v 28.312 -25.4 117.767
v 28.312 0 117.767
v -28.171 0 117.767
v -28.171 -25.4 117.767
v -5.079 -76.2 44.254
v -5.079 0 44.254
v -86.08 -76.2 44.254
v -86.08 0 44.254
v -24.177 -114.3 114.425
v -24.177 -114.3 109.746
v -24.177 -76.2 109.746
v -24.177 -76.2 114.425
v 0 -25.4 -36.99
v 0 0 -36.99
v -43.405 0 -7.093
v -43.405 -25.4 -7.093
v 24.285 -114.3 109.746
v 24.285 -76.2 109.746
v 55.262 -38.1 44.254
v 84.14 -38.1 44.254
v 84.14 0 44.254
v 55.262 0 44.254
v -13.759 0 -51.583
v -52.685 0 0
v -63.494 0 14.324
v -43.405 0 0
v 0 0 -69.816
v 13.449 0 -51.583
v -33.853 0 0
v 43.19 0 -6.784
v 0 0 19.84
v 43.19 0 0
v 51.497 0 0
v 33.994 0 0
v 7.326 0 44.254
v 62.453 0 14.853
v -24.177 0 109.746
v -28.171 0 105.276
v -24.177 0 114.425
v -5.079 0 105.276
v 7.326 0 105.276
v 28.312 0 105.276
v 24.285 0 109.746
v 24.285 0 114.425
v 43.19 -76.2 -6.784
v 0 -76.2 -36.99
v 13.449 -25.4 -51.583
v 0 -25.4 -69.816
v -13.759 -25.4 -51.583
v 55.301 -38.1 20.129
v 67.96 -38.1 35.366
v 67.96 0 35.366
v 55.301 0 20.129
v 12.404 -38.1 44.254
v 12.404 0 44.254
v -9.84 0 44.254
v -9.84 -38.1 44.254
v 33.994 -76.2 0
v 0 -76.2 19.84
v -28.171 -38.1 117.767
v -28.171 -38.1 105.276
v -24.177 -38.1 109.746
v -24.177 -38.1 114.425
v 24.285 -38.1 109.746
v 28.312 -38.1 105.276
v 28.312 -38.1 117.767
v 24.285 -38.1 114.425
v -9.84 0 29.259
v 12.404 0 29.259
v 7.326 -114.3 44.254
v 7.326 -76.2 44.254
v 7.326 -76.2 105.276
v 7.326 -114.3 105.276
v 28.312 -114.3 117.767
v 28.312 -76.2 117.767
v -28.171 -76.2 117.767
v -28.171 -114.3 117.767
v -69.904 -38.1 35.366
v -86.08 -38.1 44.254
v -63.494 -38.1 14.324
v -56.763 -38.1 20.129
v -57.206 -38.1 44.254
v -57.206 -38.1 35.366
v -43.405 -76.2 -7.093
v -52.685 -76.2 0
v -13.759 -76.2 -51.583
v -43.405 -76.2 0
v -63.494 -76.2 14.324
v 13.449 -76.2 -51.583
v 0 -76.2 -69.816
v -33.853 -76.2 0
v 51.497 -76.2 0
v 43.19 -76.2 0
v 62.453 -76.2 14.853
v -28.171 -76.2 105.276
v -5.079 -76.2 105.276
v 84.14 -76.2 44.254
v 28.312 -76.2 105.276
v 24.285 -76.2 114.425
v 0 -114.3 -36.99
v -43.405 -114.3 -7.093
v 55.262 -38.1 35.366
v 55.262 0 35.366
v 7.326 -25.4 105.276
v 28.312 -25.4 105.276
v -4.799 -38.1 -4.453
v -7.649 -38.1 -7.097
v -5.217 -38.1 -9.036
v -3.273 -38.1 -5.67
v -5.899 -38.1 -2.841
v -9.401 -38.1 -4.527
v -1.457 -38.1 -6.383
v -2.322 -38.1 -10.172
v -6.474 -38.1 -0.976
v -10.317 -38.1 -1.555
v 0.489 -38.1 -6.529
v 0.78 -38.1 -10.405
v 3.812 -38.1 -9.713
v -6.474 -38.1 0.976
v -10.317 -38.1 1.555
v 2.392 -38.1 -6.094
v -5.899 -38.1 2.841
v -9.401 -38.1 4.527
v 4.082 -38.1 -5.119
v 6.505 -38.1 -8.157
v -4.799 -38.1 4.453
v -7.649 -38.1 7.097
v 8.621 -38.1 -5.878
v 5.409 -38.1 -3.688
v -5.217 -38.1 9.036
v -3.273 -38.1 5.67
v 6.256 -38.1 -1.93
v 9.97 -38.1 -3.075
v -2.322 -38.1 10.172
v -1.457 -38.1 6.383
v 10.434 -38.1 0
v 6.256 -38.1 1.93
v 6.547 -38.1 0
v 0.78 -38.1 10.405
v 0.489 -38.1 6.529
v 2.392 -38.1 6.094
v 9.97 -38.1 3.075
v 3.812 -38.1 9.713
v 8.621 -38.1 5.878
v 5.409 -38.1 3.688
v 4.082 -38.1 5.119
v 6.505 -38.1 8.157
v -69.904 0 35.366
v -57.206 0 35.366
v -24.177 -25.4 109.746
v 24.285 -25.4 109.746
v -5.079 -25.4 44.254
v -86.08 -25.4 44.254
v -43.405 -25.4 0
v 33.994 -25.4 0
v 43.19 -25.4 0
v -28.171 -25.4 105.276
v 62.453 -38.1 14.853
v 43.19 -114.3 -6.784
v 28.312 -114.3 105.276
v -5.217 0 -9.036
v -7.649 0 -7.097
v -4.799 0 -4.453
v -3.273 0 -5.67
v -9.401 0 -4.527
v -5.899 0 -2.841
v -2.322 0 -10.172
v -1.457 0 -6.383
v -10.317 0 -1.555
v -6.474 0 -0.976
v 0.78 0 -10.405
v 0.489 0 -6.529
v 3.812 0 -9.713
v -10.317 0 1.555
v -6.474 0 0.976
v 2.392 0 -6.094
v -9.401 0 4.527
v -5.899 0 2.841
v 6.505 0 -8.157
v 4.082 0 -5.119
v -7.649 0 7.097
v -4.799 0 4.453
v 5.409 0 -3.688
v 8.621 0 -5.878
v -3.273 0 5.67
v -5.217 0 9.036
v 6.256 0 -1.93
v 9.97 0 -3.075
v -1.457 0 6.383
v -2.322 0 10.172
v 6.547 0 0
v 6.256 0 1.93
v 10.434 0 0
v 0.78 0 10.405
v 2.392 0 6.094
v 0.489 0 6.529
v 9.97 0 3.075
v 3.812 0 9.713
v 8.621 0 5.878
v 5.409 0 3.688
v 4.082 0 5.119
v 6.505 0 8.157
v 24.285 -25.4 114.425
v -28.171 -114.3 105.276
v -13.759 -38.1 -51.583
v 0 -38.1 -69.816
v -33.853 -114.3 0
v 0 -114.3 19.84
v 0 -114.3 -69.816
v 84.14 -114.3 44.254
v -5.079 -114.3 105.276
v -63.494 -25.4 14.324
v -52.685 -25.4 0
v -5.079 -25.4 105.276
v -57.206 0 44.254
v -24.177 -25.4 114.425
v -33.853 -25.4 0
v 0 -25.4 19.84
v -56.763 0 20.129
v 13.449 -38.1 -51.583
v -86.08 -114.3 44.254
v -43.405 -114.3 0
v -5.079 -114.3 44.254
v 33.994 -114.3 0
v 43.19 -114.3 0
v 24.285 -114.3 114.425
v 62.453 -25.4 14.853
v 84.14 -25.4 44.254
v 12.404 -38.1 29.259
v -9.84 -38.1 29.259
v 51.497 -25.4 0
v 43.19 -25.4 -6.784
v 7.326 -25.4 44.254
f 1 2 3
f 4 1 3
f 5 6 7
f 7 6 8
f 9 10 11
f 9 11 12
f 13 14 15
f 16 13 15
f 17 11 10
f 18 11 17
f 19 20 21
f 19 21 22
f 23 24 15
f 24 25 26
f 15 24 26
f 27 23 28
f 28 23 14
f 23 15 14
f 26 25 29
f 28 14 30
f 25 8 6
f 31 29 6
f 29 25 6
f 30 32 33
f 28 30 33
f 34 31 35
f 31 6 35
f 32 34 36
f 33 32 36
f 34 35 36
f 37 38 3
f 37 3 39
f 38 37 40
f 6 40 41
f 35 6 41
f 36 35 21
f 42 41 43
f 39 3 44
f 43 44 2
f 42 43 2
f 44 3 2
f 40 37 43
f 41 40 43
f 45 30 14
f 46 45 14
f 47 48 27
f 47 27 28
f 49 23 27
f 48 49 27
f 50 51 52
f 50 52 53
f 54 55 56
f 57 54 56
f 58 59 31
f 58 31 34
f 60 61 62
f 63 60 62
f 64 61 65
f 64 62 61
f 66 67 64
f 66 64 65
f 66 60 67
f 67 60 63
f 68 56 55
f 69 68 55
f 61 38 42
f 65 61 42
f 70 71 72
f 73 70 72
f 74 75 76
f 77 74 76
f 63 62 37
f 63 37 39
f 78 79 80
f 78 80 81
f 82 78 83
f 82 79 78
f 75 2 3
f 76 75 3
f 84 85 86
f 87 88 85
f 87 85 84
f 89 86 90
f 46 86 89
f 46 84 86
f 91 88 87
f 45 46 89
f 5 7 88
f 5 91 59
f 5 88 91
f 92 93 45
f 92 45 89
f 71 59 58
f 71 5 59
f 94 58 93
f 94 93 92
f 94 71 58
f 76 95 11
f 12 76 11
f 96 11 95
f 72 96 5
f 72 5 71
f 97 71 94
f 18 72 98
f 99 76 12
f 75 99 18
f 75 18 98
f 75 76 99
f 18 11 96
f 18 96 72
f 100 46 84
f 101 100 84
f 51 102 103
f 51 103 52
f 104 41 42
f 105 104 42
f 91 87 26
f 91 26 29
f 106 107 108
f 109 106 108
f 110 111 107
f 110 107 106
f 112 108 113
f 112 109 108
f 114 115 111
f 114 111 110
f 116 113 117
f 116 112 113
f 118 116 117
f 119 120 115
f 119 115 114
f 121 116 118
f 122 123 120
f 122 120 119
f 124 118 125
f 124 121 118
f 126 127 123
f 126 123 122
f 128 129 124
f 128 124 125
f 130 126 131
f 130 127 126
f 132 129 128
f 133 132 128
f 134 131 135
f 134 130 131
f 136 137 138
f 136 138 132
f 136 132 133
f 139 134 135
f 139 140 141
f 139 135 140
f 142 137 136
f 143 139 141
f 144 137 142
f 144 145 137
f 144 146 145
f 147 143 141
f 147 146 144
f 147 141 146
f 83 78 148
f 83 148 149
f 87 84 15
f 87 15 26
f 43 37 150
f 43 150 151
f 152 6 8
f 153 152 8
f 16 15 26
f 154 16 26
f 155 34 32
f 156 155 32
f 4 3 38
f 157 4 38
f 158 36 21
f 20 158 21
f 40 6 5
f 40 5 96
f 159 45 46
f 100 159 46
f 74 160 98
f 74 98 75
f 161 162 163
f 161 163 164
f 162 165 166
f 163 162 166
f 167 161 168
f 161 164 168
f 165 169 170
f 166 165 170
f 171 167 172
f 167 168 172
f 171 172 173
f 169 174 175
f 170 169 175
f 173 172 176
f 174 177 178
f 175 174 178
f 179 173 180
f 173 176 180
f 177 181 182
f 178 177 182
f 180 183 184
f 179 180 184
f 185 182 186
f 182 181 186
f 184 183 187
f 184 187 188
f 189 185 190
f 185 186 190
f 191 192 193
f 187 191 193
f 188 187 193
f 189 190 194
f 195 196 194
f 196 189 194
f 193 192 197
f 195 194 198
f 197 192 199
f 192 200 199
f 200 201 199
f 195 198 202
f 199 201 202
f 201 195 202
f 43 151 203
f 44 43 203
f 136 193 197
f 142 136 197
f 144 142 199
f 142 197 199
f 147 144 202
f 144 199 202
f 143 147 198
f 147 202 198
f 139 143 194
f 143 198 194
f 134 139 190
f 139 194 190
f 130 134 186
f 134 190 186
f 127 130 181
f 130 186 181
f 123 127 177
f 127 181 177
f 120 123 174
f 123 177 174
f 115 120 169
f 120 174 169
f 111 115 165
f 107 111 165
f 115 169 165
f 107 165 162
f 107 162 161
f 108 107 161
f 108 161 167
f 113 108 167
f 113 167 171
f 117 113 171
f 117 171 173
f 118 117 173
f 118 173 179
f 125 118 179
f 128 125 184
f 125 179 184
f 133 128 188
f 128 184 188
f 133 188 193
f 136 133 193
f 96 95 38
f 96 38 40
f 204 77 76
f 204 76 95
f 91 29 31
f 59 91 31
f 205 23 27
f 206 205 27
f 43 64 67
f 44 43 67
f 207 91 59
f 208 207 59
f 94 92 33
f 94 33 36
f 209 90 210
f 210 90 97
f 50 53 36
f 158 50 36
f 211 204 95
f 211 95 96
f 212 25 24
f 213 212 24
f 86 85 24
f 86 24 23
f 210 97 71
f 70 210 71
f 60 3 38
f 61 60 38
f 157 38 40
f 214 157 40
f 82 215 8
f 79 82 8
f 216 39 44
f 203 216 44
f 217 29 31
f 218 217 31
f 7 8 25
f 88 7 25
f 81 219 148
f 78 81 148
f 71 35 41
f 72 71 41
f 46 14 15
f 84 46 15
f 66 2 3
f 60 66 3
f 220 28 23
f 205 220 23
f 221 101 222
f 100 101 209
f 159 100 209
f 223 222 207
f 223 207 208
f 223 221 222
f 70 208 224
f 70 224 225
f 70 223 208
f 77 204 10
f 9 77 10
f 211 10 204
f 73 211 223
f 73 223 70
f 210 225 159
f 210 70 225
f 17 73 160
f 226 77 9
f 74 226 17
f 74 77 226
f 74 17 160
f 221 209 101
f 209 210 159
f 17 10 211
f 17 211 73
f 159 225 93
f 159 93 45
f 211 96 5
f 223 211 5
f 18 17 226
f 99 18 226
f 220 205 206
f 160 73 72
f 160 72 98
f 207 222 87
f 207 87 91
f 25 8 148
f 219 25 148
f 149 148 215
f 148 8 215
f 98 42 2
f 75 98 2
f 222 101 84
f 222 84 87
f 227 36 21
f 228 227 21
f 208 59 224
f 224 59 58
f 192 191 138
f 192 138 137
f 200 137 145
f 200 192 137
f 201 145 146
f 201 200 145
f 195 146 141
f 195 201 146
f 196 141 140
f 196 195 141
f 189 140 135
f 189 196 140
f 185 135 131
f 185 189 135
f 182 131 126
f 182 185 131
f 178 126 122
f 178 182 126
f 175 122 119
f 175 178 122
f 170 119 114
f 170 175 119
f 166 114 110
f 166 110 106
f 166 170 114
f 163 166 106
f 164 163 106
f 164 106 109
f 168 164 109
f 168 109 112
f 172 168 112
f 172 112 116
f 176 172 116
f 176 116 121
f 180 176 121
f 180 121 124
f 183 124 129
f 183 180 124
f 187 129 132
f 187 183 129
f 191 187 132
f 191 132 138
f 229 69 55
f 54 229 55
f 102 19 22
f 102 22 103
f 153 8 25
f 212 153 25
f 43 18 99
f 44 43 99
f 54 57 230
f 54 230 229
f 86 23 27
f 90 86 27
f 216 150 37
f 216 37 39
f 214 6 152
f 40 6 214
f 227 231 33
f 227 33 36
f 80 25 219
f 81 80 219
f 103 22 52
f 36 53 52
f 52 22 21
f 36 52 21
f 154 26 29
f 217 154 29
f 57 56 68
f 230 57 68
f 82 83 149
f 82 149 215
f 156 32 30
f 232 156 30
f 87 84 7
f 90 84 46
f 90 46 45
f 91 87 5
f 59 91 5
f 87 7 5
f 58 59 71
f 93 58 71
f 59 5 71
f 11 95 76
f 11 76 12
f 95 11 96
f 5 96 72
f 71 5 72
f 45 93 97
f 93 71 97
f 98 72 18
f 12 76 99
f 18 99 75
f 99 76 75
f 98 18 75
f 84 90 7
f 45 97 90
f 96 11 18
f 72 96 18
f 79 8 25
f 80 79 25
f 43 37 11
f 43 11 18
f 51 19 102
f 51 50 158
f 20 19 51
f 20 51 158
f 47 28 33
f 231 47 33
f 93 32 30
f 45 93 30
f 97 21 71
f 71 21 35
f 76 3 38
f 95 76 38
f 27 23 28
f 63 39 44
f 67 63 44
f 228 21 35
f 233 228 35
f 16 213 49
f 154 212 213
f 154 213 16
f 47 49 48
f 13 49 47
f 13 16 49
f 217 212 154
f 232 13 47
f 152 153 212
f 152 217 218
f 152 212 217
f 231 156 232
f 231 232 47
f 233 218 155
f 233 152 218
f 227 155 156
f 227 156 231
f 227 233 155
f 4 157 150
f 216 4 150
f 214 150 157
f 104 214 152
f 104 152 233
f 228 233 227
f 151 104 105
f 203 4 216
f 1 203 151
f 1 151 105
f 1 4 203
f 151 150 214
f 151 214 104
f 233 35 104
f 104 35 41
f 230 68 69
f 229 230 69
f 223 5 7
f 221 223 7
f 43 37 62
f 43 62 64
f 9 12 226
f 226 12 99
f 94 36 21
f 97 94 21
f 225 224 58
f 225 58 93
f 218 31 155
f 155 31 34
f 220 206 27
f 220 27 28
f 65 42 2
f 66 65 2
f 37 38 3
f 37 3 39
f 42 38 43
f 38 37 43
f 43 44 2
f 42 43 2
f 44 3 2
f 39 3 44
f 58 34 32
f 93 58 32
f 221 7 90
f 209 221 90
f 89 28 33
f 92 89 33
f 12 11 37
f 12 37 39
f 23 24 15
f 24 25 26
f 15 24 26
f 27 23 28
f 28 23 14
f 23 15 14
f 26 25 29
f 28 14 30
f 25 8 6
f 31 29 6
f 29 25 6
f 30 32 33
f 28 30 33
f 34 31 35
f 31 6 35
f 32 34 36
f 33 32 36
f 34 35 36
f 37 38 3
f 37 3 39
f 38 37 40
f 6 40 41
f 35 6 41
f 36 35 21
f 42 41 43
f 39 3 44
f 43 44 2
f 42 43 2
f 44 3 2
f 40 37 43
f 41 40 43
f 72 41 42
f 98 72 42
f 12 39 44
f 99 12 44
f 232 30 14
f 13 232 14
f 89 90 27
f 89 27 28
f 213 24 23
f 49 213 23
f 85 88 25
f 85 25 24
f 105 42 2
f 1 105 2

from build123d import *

# Parameters (mm, degrees)
F0_W      = 48.461918
F0_H      = 4.679083
F0_R      = 10.433779
F0_R_2    = 6.546858
F1_DEPTH  = 38.1
F0_W_2    = 12.404488
F0_H_2    = 61.022204
F2_DEPTH  = 76.2
F2_FACE_W = 48.461918
F2_FACE_H = 4.679083
F3_DEPTH  = 38.1
F4_DEPTH  = 25.4


with BuildPart() as f1:
    # F0 (on Front) → F1 (new body)
    with BuildSketch(Plane.XZ):
        Polygon((62.453386, 14.853092), (84.140211, 44.254274), (55.262458, 44.254274), (55.262458, 35.366073), (67.959888, 35.366073), (55.300537, 20.129158), align=None)
        Polygon((0, -69.815982), (13.449272, -51.582585), (-13.759367, -51.582585), align=None)
        Polygon((-86.080205, 44.254274), (-63.49443, 14.324454), (-56.763492, 20.129158), (-69.903679, 35.366073), (-57.20625, 35.366073), (-57.20625, 44.254274), align=None)
        Polygon((12.404488, 29.258548), (12.404488, 44.254274), (7.325516, 44.254274), (-5.078972, 44.254274), (-9.840053, 44.254274), (-9.840053, 29.258548), align=None)
        Polygon((-5.078972, 105.276478), (7.325516, 105.276478), (28.311934, 105.276478), (28.311934, 117.766815), (-28.171266, 117.766815), (-28.171266, 105.276478), align=None)
        with Locations((0.054005, 112.085069)):
            Rectangle(F0_W, F0_H, mode=Mode.SUBTRACT)
        Circle(F0_R)
        Circle(F0_R_2, mode=Mode.SUBTRACT)
    extrude(amount=F1_DEPTH)


with BuildPart() as f2:
    # F0 (on Front) → F2 (new body)
    with BuildSketch(Plane.XZ):
        Polygon((62.453386, 14.853092), (84.140211, 44.254274), (55.262458, 44.254274), (55.262458, 35.366073), (67.959888, 35.366073), (55.300537, 20.129158), align=None)
        Polygon((51.497486, 0), (62.453386, 14.853092), (55.300537, 20.129158), (67.959888, 35.366073), (55.262458, 35.366073), (55.262458, 44.254274), (26.752584, 44.254274), (26.752584, 29.258548), (48.084265, 29.258548), (31.147928, 15.80614), (47.033537, 11.320921), (33.993676, 0), (43.190195, 0), align=None)
        Polygon((13.449272, -51.582585), (51.497486, 0), (43.190195, 0), (43.190195, -6.783513), (0, -36.989871), (-43.404702, -7.092567), (-43.404702, 0), (-52.684847, 0), (-13.759367, -51.582585), align=None)
        Polygon((26.752584, 29.258548), (26.752584, 44.254274), (12.404488, 44.254274), (12.404488, 29.258548), (-9.840053, 29.258548), (-9.840053, 44.254274), (-24.176954, 44.254274), (-24.176954, 29.258548), (-45.508636, 29.258548), (-33.828657, 17.594593), (-48.606484, 8.974194), (-33.853007, 0), (0, 19.840313), (33.993676, 0), (47.033537, 11.320921), (31.147928, 15.80614), (48.084265, 29.258548), align=None)
        Polygon((0, -69.815982), (13.449272, -51.582585), (-13.759367, -51.582585), align=None)
        Polygon((12.404488, 29.258548), (12.404488, 44.254274), (7.325516, 44.254274), (-5.078972, 44.254274), (-9.840053, 44.254274), (-9.840053, 29.258548), align=None)
        with Locations((1.123272, 74.765376)):
            Rectangle(F0_W_2, F0_H_2)
        Polygon((-63.49443, 14.324454), (-52.684847, 0), (-43.404702, 0), (-41.229746, 0), (-33.853007, 0), (-48.606484, 8.974194), (-33.828657, 17.594593), (-45.508636, 29.258548), (-24.176954, 29.258548), (-24.176954, 44.254274), (-57.20625, 44.254274), (-57.20625, 35.366073), (-69.903679, 35.366073), (-56.763492, 20.129158), align=None)
        Polygon((-5.078972, 105.276478), (7.325516, 105.276478), (28.311934, 105.276478), (28.311934, 117.766815), (-28.171266, 117.766815), (-28.171266, 105.276478), align=None)
        with Locations((0.054005, 112.085069)):
            Rectangle(F0_W, F0_H, mode=Mode.SUBTRACT)
        Polygon((-86.080205, 44.254274), (-63.49443, 14.324454), (-56.763492, 20.129158), (-69.903679, 35.366073), (-57.20625, 35.366073), (-57.20625, 44.254274), align=None)
    extrude(amount=F2_DEPTH)


with BuildPart() as f3:
    # F2_face (on face) → F3 (new body)
    with BuildSketch(Plane(origin=(-0.605972, -76.2, 22.707464), x_dir=(1, 0, 0), z_dir=(0, -1, 0))):
        Polygon((7.931488, 82.569013), (28.917906, 82.569013), (28.917906, 95.05935), (-27.565295, 95.05935), (-27.565295, 82.569013), (-4.473, 82.569013), (-4.473, 21.54681), (-85.474233, 21.54681), (0.605972, -92.523446), (84.746182, 21.54681), (7.931488, 21.54681), align=None)
        with Locations((0.659976, 89.377603)):
            Rectangle(F2_FACE_W, F2_FACE_H, mode=Mode.SUBTRACT)
        Polygon((-42.798731, -22.707464), (-33.247036, -22.707464), (0.605972, -2.867152), (34.599647, -22.707464), (43.796167, -22.707464), (43.796167, -29.490978), (0.605972, -59.697336), (-42.798731, -29.800031), align=None, mode=Mode.SUBTRACT)
    extrude(amount=F3_DEPTH)


with BuildPart() as f4:
    # F0 (on Front) → F4 (new body)
    with BuildSketch(Plane.XZ):
        Polygon((62.453386, 14.853092), (84.140211, 44.254274), (55.262458, 44.254274), (55.262458, 35.366073), (67.959888, 35.366073), (55.300537, 20.129158), align=None)
        Polygon((51.497486, 0), (62.453386, 14.853092), (55.300537, 20.129158), (67.959888, 35.366073), (55.262458, 35.366073), (55.262458, 44.254274), (26.752584, 44.254274), (26.752584, 29.258548), (48.084265, 29.258548), (31.147928, 15.80614), (47.033537, 11.320921), (33.993676, 0), (43.190195, 0), align=None)
        Polygon((13.449272, -51.582585), (51.497486, 0), (43.190195, 0), (43.190195, -6.783513), (0, -36.989871), (-43.404702, -7.092567), (-43.404702, 0), (-52.684847, 0), (-13.759367, -51.582585), align=None)
        Polygon((26.752584, 29.258548), (26.752584, 44.254274), (12.404488, 44.254274), (12.404488, 29.258548), (-9.840053, 29.258548), (-9.840053, 44.254274), (-24.176954, 44.254274), (-24.176954, 29.258548), (-45.508636, 29.258548), (-33.828657, 17.594593), (-48.606484, 8.974194), (-33.853007, 0), (0, 19.840313), (33.993676, 0), (47.033537, 11.320921), (31.147928, 15.80614), (48.084265, 29.258548), align=None)
        Polygon((0, -69.815982), (13.449272, -51.582585), (-13.759367, -51.582585), align=None)
        Polygon((12.404488, 29.258548), (12.404488, 44.254274), (7.325516, 44.254274), (-5.078972, 44.254274), (-9.840053, 44.254274), (-9.840053, 29.258548), align=None)
        with Locations((1.123272, 74.765376)):
            Rectangle(F0_W_2, F0_H_2)
        Polygon((-63.49443, 14.324454), (-52.684847, 0), (-43.404702, 0), (-41.229746, 0), (-33.853007, 0), (-48.606484, 8.974194), (-33.828657, 17.594593), (-45.508636, 29.258548), (-24.176954, 29.258548), (-24.176954, 44.254274), (-57.20625, 44.254274), (-57.20625, 35.366073), (-69.903679, 35.366073), (-56.763492, 20.129158), align=None)
        Polygon((-5.078972, 105.276478), (7.325516, 105.276478), (28.311934, 105.276478), (28.311934, 117.766815), (-28.171266, 117.766815), (-28.171266, 105.276478), align=None)
        with Locations((0.054005, 112.085069)):
            Rectangle(F0_W, F0_H, mode=Mode.SUBTRACT)
        Polygon((-86.080205, 44.254274), (-63.49443, 14.324454), (-56.763492, 20.129158), (-69.903679, 35.366073), (-57.20625, 35.366073), (-57.20625, 44.254274), align=None)
    extrude(amount=F4_DEPTH)


solid = Compound([f1.part, f2.part, f3.part, f4.part])
